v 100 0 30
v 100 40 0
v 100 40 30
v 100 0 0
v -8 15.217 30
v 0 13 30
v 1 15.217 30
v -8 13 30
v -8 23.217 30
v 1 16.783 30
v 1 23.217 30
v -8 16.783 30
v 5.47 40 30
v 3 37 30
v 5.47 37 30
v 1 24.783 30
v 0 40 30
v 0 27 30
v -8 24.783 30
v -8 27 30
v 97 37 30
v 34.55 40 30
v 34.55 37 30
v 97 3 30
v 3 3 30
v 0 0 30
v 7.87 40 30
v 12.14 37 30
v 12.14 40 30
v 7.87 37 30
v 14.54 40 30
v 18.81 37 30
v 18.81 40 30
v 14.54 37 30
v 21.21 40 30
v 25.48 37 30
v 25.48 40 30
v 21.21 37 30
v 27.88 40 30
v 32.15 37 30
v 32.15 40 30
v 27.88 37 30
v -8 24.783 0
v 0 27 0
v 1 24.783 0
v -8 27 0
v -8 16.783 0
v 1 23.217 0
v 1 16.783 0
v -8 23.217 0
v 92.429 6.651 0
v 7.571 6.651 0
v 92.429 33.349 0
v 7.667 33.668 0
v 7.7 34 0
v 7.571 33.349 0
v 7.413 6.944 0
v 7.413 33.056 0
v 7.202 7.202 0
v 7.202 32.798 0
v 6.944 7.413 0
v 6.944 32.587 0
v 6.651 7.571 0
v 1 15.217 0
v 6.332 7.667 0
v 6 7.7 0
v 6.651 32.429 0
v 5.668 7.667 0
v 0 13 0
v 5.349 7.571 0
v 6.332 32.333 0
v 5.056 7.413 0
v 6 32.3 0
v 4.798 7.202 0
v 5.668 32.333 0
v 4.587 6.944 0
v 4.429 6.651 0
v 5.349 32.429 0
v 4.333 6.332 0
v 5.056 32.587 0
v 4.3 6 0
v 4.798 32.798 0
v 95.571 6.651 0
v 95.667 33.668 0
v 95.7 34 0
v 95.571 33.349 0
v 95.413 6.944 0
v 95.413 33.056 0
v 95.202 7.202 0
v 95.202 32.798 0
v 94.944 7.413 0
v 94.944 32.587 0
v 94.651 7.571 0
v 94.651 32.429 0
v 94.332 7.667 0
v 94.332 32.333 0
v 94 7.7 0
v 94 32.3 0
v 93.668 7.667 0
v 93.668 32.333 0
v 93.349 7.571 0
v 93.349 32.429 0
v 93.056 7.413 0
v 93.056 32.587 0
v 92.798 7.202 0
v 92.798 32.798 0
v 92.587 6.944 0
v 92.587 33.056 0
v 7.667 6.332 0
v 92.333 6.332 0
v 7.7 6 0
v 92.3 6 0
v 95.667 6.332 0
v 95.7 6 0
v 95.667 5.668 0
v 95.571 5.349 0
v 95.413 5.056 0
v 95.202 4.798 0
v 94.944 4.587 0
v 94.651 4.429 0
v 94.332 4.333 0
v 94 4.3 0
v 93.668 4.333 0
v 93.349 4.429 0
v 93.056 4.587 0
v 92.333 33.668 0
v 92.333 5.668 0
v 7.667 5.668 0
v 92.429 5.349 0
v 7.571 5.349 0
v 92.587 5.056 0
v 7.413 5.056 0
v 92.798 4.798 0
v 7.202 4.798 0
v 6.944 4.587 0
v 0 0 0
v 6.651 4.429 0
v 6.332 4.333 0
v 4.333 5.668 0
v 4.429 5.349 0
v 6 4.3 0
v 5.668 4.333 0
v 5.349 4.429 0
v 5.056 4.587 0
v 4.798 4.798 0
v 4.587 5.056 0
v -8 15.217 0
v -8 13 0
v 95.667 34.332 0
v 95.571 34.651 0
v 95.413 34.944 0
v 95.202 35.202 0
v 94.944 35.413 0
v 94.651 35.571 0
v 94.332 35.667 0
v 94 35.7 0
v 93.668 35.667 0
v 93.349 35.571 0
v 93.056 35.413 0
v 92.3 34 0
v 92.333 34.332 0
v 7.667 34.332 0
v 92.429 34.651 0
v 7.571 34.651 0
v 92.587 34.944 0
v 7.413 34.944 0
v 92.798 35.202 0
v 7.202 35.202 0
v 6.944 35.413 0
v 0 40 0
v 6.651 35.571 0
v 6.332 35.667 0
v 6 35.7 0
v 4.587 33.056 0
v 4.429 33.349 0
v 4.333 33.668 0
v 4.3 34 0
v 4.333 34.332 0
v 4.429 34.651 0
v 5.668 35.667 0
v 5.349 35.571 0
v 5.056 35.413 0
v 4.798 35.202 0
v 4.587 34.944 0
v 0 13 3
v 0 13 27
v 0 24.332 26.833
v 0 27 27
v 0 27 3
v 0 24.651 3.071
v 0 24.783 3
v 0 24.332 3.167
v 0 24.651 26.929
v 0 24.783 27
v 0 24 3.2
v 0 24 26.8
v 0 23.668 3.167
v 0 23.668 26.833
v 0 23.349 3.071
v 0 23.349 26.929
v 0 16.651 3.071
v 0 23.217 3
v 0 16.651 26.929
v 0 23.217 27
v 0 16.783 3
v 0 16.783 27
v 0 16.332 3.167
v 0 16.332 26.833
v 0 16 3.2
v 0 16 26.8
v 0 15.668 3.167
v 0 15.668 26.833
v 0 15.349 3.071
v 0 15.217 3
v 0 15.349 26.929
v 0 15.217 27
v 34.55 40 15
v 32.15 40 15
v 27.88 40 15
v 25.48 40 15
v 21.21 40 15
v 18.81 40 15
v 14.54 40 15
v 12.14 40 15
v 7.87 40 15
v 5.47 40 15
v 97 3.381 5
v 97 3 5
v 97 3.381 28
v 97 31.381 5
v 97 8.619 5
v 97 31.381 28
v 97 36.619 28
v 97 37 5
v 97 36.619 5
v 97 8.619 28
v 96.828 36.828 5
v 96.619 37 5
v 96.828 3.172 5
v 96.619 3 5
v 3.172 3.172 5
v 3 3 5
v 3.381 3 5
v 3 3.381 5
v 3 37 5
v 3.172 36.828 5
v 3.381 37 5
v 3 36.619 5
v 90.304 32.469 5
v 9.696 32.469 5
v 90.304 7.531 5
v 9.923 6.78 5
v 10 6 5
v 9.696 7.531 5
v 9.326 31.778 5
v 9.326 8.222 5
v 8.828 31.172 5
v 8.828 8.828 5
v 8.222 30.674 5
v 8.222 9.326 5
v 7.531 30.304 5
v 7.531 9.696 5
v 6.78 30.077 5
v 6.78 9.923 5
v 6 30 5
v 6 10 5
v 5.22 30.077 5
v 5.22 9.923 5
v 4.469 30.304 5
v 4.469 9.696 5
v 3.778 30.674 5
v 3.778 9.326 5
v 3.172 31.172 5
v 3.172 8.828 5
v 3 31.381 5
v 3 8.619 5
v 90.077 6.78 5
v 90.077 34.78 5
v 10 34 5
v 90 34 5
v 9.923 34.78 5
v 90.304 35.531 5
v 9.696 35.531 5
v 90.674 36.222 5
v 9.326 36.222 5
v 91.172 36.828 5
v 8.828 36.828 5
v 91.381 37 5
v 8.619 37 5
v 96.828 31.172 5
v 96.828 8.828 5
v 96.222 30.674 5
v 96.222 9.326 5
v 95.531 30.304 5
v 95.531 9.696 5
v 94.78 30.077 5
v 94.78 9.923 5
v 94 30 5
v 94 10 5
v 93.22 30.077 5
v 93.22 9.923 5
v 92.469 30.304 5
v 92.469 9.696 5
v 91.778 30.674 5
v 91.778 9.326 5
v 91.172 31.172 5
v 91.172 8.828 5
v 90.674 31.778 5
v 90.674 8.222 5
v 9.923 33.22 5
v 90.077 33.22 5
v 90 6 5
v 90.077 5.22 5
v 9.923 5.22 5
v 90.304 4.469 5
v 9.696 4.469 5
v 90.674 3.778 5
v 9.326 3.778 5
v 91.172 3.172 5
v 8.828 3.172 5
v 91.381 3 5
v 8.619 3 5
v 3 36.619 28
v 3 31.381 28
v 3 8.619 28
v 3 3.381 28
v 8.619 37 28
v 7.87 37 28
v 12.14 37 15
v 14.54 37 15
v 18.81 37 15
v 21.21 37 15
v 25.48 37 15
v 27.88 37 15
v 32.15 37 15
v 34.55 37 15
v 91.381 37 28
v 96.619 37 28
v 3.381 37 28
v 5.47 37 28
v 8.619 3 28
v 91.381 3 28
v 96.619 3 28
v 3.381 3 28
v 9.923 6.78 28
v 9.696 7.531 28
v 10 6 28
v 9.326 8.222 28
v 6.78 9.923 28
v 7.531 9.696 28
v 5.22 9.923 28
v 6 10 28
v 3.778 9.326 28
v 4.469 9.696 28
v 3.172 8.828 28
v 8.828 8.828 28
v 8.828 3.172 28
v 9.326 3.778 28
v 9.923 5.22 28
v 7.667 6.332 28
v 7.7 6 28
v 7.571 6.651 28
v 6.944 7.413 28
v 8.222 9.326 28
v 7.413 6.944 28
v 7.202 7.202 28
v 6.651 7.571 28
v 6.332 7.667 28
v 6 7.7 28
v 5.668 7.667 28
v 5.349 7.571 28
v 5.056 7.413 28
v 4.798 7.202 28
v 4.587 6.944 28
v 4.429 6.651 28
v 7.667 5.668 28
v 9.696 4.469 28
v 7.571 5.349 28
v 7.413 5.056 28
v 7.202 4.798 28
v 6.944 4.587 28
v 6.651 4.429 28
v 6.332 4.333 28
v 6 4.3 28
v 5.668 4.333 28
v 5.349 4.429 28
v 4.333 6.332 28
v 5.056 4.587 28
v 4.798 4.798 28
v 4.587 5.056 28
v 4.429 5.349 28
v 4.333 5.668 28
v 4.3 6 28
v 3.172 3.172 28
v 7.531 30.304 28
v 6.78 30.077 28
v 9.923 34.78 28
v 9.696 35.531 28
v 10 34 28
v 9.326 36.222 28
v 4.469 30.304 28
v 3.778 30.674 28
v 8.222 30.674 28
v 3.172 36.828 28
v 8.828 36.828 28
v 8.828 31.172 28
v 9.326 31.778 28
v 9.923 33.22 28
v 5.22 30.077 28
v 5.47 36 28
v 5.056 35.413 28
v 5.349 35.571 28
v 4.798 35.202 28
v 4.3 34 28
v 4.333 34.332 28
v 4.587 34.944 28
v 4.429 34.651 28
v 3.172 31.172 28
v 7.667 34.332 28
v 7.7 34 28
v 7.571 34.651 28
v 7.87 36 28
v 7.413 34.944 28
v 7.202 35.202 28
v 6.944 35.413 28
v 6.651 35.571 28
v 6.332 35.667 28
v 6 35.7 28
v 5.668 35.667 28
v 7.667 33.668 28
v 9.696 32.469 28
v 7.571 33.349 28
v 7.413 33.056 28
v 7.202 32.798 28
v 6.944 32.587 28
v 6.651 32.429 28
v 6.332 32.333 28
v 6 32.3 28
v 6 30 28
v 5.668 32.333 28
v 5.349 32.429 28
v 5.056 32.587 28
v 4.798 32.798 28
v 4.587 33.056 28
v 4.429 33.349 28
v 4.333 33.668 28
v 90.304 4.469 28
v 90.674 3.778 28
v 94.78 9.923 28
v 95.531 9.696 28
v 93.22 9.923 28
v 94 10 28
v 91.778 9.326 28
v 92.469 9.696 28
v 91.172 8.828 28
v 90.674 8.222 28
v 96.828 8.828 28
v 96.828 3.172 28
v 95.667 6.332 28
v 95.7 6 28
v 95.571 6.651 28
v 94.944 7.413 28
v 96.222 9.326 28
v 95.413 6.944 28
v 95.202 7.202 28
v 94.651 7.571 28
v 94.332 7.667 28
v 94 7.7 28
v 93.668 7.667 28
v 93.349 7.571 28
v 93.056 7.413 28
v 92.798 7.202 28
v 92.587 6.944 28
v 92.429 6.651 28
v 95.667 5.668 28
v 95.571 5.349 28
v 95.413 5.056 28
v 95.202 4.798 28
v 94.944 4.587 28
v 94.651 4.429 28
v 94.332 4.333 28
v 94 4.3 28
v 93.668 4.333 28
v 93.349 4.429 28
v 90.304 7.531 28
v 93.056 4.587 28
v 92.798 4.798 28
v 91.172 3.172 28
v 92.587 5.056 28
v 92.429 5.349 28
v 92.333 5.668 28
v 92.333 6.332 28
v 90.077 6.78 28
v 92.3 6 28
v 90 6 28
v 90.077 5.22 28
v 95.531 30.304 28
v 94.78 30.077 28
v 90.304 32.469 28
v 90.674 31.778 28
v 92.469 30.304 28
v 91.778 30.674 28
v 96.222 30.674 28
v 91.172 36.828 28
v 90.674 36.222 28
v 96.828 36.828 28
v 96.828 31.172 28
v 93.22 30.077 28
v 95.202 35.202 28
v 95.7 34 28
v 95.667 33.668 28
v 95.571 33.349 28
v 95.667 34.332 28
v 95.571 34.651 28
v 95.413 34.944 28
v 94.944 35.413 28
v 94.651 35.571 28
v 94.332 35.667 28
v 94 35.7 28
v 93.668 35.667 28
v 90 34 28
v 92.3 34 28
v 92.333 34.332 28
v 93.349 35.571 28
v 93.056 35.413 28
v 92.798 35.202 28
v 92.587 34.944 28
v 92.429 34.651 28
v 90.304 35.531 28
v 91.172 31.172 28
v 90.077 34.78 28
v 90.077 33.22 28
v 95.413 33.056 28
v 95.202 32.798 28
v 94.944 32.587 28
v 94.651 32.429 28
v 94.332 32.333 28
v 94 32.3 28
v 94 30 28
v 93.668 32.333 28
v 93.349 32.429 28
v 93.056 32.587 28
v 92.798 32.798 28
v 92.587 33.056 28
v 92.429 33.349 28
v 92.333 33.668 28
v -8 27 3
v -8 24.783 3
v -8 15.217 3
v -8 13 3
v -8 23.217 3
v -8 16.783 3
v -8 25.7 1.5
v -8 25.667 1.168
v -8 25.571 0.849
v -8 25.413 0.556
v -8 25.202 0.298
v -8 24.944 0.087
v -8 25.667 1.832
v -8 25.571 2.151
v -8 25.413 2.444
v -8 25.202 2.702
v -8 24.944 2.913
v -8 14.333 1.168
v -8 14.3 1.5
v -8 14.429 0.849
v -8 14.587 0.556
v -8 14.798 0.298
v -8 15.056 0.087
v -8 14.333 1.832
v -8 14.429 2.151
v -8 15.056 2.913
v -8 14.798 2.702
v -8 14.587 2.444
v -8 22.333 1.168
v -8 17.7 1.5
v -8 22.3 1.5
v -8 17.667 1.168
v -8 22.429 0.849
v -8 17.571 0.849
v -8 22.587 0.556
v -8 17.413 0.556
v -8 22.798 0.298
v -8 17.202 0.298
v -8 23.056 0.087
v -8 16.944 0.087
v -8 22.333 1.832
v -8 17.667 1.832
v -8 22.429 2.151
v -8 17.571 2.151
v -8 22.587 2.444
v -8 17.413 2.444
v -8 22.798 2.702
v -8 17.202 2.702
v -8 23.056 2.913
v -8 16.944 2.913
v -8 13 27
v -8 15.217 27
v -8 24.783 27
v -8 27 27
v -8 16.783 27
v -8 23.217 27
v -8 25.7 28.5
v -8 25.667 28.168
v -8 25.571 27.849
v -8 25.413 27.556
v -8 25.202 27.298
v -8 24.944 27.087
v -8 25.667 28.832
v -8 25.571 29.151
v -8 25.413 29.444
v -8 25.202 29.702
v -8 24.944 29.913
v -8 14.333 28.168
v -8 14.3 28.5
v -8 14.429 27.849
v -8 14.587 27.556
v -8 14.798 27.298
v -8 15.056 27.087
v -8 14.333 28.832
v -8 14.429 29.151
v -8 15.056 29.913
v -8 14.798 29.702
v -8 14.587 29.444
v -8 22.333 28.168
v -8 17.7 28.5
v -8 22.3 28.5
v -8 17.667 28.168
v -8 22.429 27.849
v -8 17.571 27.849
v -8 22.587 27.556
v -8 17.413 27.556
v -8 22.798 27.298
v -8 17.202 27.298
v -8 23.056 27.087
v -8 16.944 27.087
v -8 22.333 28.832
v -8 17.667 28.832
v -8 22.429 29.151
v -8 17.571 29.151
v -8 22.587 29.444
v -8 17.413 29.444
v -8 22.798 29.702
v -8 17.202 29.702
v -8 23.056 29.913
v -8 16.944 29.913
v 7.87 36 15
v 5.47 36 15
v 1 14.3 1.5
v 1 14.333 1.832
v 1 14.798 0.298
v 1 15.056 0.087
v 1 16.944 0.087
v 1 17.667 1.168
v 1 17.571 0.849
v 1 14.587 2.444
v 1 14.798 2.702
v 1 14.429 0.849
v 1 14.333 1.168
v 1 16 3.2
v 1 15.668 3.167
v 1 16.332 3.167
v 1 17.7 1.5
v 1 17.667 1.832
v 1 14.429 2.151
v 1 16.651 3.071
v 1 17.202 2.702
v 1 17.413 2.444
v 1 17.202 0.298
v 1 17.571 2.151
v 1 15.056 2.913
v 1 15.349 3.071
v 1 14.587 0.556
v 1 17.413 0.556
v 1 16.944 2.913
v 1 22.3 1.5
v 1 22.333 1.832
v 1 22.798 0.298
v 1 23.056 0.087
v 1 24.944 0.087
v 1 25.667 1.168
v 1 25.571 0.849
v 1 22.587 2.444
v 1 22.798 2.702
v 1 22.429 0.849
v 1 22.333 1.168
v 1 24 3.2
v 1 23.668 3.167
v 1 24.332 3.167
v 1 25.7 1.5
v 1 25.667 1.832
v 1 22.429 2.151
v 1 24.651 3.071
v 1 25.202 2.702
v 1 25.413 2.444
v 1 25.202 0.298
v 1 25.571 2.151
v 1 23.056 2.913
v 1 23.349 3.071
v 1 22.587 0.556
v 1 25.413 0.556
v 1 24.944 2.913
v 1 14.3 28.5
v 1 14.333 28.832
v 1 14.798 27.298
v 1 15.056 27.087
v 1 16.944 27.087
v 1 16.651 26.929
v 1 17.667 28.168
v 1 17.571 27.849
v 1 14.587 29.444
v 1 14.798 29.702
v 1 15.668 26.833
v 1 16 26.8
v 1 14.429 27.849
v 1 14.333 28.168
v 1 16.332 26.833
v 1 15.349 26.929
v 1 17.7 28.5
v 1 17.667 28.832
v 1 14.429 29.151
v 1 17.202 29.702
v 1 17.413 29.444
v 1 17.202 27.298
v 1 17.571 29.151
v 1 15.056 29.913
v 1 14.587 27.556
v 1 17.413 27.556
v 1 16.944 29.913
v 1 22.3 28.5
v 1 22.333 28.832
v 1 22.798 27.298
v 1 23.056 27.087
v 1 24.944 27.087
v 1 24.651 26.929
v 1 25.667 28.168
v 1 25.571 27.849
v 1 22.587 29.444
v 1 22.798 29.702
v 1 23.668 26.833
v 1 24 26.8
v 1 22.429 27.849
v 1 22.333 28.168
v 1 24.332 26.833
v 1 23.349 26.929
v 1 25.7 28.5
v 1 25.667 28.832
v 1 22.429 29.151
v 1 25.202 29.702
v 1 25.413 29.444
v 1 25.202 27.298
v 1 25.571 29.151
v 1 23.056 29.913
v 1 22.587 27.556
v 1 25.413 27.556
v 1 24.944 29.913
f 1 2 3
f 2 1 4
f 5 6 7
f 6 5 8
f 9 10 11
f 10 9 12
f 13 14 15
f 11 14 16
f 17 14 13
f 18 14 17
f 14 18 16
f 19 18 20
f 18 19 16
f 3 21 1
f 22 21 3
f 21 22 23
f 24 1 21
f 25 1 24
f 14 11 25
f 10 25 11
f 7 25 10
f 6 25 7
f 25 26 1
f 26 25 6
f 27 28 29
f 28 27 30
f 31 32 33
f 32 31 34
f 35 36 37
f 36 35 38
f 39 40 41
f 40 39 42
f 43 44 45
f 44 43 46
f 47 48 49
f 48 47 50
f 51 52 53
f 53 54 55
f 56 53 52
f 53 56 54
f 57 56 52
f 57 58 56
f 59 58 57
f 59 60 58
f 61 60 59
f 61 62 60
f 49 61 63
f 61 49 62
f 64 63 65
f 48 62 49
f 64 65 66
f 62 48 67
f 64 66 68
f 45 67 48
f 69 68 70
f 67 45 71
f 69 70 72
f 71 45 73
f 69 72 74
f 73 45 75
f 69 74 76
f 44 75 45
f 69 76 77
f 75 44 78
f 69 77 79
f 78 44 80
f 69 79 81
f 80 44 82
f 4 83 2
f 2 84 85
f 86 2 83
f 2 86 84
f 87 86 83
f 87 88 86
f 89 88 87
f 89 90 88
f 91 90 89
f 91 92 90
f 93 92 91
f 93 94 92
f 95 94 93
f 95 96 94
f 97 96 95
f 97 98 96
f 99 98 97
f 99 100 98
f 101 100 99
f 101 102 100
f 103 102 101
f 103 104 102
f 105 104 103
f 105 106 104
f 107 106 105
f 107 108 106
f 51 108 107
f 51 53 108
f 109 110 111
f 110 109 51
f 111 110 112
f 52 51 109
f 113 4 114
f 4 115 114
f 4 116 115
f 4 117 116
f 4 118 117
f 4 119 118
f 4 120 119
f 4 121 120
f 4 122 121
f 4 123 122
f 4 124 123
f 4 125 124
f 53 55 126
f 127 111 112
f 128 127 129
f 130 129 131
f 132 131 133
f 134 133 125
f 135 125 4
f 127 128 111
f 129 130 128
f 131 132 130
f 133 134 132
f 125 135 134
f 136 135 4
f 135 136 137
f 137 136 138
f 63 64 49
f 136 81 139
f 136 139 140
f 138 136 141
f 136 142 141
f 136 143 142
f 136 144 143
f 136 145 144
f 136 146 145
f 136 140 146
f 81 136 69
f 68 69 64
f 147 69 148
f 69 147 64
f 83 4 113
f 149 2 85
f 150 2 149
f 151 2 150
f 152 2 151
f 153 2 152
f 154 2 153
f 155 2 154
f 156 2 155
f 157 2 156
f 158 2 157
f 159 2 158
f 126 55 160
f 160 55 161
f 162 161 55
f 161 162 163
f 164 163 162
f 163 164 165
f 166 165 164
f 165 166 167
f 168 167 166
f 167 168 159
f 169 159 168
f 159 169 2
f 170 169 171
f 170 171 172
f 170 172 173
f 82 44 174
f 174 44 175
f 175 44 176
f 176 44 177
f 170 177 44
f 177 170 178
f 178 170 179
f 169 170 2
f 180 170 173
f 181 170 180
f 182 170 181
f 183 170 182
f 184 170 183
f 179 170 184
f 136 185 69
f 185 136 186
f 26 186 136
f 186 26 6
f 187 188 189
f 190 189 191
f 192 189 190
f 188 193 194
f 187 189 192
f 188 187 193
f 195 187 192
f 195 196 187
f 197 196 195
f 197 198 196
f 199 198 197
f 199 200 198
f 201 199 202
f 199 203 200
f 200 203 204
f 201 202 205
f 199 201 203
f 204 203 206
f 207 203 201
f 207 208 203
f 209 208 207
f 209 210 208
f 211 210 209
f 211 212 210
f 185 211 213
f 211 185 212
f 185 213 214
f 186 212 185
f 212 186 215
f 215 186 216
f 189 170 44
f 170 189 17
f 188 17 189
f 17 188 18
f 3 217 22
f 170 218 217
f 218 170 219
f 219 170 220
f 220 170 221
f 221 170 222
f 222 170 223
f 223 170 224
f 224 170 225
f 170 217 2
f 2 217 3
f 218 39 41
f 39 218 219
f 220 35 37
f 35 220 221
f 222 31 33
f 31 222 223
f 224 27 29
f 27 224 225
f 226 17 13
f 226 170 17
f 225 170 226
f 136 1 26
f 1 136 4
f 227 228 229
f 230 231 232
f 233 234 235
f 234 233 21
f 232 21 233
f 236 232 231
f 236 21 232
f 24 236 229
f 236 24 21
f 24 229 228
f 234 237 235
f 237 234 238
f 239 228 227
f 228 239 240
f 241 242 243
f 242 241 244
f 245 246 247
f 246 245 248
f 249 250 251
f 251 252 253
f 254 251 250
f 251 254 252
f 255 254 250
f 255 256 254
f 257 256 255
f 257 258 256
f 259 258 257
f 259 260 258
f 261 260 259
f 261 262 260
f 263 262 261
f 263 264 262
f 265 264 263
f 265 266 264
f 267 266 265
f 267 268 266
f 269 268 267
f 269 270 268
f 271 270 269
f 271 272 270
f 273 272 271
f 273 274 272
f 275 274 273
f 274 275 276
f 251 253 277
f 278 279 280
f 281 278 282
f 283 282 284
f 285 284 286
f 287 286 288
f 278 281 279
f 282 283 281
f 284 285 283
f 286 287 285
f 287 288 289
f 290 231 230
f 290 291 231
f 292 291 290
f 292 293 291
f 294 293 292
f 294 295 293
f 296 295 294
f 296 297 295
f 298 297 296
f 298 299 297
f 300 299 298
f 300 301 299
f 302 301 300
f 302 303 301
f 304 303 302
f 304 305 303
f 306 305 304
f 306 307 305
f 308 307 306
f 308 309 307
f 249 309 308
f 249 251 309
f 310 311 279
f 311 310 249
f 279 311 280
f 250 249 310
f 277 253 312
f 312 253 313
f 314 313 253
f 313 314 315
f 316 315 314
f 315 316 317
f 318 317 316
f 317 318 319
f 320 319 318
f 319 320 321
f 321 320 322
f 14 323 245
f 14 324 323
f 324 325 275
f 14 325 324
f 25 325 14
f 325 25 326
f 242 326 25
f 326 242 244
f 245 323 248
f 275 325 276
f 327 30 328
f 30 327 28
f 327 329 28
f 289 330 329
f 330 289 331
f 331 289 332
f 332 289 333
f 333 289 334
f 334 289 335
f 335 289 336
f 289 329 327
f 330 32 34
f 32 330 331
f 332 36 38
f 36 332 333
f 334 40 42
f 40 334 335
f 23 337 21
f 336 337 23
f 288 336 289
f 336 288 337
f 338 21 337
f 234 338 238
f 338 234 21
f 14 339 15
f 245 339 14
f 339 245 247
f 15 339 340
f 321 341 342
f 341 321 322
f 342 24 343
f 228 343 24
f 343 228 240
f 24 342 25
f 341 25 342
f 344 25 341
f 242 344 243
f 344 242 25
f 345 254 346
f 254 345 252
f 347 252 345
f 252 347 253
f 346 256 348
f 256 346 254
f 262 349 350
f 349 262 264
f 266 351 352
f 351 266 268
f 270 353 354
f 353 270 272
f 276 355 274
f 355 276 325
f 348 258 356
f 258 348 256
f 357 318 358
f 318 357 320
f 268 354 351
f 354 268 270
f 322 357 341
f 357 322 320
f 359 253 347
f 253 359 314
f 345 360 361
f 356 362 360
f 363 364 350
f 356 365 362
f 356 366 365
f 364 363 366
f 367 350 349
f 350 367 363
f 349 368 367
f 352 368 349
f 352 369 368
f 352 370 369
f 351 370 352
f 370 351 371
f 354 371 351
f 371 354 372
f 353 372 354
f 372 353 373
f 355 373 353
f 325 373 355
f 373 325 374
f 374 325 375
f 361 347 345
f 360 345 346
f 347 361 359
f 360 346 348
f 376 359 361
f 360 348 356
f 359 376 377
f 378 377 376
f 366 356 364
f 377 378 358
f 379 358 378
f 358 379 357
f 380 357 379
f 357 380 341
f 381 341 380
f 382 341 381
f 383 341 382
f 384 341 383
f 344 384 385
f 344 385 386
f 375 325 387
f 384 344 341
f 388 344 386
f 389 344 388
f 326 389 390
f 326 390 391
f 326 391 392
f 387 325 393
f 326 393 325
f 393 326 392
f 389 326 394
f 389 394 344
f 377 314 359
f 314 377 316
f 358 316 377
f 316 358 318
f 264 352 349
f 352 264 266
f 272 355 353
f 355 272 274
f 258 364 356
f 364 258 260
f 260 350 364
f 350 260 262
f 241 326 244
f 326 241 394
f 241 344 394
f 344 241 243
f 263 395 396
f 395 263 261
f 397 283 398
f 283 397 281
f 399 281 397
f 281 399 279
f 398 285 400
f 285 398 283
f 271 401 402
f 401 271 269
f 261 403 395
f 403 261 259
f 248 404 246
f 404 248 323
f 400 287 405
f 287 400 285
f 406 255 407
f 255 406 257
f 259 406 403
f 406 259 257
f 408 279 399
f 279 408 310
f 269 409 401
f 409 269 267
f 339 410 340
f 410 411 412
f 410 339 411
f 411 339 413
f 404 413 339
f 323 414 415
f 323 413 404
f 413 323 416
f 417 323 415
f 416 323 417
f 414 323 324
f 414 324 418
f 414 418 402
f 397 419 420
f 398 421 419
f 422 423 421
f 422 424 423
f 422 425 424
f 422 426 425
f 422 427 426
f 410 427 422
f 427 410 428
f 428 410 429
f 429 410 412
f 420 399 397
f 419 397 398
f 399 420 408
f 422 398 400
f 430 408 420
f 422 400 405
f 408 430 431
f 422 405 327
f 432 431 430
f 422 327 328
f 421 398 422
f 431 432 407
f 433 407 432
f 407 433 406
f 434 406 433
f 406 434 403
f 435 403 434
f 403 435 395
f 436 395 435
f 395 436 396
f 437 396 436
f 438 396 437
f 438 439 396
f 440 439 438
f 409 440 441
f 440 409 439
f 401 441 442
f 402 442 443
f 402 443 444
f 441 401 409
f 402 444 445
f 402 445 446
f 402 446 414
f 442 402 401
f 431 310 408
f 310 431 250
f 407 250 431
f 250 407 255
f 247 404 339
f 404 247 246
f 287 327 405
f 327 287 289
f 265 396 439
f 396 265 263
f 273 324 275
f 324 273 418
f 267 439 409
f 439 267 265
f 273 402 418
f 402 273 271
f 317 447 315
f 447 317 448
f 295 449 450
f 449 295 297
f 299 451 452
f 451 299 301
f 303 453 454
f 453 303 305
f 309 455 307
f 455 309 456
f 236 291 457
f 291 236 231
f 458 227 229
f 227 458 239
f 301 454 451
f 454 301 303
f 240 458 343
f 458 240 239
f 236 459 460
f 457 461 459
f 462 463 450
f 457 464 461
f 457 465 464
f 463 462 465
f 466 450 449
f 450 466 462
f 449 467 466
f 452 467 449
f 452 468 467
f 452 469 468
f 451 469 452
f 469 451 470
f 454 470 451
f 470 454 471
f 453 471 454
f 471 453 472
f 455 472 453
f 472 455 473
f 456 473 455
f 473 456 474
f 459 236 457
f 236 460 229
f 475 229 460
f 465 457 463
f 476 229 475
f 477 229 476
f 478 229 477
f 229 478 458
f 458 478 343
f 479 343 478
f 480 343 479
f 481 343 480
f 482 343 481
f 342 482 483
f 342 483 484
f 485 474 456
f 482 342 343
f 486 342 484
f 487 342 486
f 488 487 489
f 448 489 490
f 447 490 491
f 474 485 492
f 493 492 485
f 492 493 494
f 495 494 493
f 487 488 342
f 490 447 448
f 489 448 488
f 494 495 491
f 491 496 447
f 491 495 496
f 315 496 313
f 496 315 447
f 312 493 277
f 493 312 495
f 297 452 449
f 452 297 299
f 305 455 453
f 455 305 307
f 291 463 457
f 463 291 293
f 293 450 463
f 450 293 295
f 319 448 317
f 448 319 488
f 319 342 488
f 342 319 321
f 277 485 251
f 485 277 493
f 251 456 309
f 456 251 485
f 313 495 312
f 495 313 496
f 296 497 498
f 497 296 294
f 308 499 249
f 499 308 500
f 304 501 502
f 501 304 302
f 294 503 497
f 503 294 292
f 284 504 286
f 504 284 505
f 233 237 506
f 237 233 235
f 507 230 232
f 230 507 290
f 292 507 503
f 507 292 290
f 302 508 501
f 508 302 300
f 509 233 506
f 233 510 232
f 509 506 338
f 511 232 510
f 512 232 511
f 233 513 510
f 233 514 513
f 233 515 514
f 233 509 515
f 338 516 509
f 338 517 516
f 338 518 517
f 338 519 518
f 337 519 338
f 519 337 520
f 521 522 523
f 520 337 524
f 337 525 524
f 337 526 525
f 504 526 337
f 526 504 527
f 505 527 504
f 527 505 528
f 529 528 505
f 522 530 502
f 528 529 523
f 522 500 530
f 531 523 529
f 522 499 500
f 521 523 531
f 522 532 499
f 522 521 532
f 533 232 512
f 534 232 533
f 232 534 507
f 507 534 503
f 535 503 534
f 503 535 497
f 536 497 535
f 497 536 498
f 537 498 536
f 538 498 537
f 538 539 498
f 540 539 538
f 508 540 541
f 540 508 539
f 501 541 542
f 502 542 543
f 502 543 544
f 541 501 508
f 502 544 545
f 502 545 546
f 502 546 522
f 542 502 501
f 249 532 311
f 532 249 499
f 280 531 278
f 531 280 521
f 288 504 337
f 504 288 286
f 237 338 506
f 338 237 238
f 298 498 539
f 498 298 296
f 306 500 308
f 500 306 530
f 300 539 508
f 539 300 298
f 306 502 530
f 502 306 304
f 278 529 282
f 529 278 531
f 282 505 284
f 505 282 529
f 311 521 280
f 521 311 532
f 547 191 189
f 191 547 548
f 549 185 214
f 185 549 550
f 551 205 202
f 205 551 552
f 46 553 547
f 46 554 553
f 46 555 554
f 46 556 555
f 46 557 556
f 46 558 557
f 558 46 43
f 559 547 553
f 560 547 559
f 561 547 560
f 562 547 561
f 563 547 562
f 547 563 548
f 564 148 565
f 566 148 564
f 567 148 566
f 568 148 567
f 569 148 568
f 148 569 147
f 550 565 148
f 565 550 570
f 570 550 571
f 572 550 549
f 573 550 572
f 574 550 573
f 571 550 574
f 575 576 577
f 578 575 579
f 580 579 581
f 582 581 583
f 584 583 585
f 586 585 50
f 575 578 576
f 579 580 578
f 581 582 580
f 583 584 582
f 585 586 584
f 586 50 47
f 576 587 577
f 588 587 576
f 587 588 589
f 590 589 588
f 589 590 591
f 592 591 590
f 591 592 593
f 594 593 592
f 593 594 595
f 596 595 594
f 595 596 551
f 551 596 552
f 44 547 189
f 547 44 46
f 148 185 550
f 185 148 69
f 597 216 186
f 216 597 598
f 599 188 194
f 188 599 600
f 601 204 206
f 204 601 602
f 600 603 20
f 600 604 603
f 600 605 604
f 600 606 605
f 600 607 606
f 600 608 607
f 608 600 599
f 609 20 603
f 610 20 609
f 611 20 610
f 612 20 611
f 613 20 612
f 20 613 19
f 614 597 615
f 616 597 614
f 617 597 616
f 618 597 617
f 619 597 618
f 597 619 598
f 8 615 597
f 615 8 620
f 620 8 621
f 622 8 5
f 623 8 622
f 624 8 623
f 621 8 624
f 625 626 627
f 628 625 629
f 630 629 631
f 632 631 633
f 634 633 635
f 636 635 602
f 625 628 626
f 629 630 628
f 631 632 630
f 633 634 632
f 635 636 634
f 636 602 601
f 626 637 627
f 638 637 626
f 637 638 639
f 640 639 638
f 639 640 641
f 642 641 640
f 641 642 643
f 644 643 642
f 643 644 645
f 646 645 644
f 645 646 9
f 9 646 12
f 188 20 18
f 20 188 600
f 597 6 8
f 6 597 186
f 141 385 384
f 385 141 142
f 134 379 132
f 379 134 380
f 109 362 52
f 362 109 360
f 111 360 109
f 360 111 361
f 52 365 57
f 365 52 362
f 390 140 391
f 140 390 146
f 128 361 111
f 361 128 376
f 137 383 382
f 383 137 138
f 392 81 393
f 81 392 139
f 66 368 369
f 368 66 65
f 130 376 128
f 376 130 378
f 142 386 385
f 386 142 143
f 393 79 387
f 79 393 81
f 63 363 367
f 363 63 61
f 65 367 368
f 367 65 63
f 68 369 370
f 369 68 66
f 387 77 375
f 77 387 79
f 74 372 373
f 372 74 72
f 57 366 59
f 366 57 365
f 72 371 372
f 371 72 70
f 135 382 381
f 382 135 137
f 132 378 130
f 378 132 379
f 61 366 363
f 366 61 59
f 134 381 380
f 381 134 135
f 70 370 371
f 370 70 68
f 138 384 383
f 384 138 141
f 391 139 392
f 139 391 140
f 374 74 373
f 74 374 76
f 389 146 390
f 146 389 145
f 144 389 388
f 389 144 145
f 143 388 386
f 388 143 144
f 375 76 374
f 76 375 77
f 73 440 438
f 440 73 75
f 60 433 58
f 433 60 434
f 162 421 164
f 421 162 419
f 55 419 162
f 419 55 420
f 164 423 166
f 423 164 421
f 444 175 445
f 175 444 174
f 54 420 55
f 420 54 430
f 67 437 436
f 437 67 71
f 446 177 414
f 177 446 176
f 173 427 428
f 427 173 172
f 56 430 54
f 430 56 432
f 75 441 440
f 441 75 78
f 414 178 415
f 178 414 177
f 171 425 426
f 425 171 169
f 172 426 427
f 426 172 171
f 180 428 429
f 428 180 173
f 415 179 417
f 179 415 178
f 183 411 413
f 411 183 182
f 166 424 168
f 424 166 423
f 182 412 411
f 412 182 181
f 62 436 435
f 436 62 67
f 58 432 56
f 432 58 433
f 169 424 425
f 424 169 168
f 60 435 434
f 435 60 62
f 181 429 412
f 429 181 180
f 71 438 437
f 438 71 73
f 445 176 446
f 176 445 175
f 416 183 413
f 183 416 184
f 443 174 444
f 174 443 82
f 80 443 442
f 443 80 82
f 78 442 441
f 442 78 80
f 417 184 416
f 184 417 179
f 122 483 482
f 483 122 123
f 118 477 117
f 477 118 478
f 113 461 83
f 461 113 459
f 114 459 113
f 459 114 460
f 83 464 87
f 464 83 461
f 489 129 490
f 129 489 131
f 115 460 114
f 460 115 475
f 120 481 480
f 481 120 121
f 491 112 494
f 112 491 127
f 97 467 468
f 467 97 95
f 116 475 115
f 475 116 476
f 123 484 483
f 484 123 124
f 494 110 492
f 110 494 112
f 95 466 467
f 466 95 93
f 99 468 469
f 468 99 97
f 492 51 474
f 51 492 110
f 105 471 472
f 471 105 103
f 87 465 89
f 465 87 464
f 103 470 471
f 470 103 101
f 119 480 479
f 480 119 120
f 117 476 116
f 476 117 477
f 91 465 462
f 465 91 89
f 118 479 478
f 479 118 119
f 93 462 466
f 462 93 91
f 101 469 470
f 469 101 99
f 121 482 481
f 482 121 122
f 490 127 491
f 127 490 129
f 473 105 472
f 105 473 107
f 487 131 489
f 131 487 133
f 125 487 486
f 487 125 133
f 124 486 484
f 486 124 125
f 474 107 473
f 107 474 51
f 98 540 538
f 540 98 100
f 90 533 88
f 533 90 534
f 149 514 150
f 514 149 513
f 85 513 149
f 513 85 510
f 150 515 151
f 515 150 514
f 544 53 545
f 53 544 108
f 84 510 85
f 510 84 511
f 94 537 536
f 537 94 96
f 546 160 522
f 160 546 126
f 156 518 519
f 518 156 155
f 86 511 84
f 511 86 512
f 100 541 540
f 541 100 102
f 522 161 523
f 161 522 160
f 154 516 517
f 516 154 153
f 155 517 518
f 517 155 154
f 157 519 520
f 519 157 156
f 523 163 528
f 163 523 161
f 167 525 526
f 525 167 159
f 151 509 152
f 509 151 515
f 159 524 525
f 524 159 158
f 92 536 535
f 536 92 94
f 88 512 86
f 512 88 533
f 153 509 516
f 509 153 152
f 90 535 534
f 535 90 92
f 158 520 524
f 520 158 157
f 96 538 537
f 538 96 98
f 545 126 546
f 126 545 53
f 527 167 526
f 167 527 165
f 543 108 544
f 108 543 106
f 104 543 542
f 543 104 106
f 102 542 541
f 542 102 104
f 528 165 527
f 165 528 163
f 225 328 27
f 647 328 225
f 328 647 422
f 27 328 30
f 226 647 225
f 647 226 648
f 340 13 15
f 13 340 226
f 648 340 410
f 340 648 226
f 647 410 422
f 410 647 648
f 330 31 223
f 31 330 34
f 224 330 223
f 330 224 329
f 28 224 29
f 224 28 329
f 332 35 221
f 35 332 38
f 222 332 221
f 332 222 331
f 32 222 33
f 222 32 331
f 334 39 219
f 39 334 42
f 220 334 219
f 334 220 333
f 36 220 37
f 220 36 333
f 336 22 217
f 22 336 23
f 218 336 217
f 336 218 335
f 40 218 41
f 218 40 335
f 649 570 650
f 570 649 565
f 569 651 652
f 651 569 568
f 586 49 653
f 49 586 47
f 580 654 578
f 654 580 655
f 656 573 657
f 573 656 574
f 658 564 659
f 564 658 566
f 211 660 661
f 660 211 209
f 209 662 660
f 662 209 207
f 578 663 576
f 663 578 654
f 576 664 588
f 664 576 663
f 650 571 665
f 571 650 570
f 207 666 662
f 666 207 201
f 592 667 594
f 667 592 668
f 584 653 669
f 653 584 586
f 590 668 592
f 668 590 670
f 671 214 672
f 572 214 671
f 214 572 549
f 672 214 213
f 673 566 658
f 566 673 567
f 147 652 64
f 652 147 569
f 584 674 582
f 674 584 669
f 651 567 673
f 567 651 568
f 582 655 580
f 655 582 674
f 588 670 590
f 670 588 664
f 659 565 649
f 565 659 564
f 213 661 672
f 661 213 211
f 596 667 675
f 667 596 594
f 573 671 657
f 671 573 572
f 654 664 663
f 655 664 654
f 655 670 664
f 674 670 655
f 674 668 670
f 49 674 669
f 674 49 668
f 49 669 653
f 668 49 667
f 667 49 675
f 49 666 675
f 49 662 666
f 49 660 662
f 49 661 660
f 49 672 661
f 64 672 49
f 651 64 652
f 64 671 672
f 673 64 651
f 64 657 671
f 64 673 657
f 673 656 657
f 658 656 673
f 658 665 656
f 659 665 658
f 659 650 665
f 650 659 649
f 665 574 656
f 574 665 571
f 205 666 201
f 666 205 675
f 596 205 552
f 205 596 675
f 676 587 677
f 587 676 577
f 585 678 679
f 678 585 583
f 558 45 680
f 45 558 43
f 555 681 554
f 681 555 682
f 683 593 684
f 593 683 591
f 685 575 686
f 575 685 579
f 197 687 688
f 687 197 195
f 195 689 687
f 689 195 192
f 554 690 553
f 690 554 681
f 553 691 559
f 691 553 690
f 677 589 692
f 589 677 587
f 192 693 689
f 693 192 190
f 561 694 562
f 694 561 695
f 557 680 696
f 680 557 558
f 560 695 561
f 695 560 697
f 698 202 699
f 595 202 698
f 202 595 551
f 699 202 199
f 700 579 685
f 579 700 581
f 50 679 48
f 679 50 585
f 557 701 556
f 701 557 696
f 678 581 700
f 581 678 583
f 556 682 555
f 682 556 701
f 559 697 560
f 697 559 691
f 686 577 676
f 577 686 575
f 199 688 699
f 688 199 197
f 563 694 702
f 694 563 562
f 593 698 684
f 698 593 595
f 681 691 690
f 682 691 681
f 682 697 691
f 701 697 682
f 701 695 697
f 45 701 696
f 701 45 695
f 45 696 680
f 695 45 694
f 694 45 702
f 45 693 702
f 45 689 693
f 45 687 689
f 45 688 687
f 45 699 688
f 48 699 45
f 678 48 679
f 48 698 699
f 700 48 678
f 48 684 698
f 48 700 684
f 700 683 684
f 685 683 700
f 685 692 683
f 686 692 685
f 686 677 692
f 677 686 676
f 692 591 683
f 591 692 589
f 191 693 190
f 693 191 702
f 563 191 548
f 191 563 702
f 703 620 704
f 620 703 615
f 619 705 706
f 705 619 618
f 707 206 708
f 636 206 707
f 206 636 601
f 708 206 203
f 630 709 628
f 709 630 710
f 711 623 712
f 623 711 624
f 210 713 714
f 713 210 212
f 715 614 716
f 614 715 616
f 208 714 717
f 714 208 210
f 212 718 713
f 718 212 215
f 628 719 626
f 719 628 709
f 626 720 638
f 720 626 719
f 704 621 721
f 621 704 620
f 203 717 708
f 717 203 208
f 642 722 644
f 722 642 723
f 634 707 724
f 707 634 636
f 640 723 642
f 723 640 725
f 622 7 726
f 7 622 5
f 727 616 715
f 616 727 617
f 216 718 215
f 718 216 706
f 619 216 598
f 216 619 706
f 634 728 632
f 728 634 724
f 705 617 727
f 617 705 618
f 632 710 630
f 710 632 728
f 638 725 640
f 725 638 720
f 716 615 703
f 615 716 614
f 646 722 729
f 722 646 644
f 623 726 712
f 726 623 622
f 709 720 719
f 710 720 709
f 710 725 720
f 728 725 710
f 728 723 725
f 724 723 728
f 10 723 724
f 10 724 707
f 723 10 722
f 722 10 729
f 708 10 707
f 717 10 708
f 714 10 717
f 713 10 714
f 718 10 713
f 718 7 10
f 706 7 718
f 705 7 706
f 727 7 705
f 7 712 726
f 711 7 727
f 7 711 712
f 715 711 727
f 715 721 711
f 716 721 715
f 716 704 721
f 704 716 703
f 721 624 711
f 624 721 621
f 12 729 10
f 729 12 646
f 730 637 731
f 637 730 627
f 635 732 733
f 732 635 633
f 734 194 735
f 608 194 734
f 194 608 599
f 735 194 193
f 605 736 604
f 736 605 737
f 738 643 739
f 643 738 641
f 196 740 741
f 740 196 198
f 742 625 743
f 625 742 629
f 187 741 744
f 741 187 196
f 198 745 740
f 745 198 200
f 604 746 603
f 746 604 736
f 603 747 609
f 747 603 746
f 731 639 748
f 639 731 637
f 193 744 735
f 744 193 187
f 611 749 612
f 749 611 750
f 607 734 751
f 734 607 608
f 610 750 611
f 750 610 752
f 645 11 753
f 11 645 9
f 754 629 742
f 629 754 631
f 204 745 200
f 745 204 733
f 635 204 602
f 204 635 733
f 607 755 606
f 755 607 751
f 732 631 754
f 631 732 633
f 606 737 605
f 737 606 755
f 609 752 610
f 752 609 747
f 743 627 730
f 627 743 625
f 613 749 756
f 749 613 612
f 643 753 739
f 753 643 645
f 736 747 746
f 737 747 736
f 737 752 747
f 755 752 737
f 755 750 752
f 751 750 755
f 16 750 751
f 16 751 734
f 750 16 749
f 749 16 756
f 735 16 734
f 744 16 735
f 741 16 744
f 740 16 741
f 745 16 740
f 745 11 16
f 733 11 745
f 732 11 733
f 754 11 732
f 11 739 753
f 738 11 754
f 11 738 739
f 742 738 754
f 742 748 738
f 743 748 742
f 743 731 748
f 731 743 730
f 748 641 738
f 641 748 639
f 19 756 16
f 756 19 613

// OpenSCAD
$fn = 32;

// ----------------------------------------------------------------------
// Enclosure body: 100 x 40 x 30 mm, wall 3 mm
// ----------------------------------------------------------------------

// --- parameters (mm) ---
length = 100;             // outside length, X
width = 40;               // outside width, Y
height = 30;              // outside height, Z
wall = 3;                 // side wall thickness
floor_t = 5;              // floor thickness
boss_d = 8;               // corner boss diameter
boss_h = 23;              // corner boss height above the floor
boss_hole_d = 3.4;        // lid screw clearance in the boss
boss_lip = 6;             // boss centre inset from the corner
ear_w = 14;               // mounting ear width
ear_t = 3;                // mounting ear thickness
ear_ext = 8;              // mounting ear reach
ear_hole_d = 3.4;         // mounting ear drills
vent_slots = 5;           // vent slots in the long wall
vent_w = 2.4;             // vent slot width
vent_h = 20;              // vent slot height
vent_pitch = 6.67;        // vent slot pitch
vent_z = 15;              // vent slot sill height

module shell() {
  difference() {
    cube([length, width, height]);
    /* hollow, open at the top */
    translate([wall, wall, floor_t])
      cube([length - 2 * wall, width - 2 * wall, height]);
  }
}

module bosses() {
  /* corner bosses, sunk 1 mm into the floor */
  for (sx = [0, 1]) for (sy = [0, 1])
    translate([sx * (length - 2 * boss_lip) + boss_lip, sy * (width - 2 * boss_lip) + boss_lip, floor_t - 1])
      cylinder(h = boss_h + 1, d = boss_d);
}

module ears() {
  /* mounting ears on the short walls, sunk into the wall */
  for (sz = [0, 1])
    translate([-ear_ext, width / 2 - ear_w / 2, sz * (height - ear_t)])
      cube([ear_ext + 2.5, ear_w, ear_t]);
}

difference() {
  union() {
    shell();
    bosses();
    ears();
  }
  /* boss screw holes */
  for (sx = [0, 1]) for (sy = [0, 1])
    translate([sx * (length - 2 * boss_lip) + boss_lip, sy * (width - 2 * boss_lip) + boss_lip, -1]) cylinder(h = floor_t + boss_h + 2, d = boss_hole_d);
  /* vent grille in the +Y wall */
  for (i = [0 : vent_slots - 1]) translate([vent_pitch * (i + 1) - vent_w / 2, width - wall - 1, vent_z]) cube([vent_w, wall + 2, vent_h]);
  for (sz = [0, 1]) for (sx = [0, 1]) translate([-ear_ext - 1, width / 2 + (2 * sx - 1) * (ear_w / 2 - 3), sz * (height - ear_t) + ear_t / 2]) rotate([0, 90, 0]) cylinder(h = ear_ext + 2, d = ear_hole_d);
}
